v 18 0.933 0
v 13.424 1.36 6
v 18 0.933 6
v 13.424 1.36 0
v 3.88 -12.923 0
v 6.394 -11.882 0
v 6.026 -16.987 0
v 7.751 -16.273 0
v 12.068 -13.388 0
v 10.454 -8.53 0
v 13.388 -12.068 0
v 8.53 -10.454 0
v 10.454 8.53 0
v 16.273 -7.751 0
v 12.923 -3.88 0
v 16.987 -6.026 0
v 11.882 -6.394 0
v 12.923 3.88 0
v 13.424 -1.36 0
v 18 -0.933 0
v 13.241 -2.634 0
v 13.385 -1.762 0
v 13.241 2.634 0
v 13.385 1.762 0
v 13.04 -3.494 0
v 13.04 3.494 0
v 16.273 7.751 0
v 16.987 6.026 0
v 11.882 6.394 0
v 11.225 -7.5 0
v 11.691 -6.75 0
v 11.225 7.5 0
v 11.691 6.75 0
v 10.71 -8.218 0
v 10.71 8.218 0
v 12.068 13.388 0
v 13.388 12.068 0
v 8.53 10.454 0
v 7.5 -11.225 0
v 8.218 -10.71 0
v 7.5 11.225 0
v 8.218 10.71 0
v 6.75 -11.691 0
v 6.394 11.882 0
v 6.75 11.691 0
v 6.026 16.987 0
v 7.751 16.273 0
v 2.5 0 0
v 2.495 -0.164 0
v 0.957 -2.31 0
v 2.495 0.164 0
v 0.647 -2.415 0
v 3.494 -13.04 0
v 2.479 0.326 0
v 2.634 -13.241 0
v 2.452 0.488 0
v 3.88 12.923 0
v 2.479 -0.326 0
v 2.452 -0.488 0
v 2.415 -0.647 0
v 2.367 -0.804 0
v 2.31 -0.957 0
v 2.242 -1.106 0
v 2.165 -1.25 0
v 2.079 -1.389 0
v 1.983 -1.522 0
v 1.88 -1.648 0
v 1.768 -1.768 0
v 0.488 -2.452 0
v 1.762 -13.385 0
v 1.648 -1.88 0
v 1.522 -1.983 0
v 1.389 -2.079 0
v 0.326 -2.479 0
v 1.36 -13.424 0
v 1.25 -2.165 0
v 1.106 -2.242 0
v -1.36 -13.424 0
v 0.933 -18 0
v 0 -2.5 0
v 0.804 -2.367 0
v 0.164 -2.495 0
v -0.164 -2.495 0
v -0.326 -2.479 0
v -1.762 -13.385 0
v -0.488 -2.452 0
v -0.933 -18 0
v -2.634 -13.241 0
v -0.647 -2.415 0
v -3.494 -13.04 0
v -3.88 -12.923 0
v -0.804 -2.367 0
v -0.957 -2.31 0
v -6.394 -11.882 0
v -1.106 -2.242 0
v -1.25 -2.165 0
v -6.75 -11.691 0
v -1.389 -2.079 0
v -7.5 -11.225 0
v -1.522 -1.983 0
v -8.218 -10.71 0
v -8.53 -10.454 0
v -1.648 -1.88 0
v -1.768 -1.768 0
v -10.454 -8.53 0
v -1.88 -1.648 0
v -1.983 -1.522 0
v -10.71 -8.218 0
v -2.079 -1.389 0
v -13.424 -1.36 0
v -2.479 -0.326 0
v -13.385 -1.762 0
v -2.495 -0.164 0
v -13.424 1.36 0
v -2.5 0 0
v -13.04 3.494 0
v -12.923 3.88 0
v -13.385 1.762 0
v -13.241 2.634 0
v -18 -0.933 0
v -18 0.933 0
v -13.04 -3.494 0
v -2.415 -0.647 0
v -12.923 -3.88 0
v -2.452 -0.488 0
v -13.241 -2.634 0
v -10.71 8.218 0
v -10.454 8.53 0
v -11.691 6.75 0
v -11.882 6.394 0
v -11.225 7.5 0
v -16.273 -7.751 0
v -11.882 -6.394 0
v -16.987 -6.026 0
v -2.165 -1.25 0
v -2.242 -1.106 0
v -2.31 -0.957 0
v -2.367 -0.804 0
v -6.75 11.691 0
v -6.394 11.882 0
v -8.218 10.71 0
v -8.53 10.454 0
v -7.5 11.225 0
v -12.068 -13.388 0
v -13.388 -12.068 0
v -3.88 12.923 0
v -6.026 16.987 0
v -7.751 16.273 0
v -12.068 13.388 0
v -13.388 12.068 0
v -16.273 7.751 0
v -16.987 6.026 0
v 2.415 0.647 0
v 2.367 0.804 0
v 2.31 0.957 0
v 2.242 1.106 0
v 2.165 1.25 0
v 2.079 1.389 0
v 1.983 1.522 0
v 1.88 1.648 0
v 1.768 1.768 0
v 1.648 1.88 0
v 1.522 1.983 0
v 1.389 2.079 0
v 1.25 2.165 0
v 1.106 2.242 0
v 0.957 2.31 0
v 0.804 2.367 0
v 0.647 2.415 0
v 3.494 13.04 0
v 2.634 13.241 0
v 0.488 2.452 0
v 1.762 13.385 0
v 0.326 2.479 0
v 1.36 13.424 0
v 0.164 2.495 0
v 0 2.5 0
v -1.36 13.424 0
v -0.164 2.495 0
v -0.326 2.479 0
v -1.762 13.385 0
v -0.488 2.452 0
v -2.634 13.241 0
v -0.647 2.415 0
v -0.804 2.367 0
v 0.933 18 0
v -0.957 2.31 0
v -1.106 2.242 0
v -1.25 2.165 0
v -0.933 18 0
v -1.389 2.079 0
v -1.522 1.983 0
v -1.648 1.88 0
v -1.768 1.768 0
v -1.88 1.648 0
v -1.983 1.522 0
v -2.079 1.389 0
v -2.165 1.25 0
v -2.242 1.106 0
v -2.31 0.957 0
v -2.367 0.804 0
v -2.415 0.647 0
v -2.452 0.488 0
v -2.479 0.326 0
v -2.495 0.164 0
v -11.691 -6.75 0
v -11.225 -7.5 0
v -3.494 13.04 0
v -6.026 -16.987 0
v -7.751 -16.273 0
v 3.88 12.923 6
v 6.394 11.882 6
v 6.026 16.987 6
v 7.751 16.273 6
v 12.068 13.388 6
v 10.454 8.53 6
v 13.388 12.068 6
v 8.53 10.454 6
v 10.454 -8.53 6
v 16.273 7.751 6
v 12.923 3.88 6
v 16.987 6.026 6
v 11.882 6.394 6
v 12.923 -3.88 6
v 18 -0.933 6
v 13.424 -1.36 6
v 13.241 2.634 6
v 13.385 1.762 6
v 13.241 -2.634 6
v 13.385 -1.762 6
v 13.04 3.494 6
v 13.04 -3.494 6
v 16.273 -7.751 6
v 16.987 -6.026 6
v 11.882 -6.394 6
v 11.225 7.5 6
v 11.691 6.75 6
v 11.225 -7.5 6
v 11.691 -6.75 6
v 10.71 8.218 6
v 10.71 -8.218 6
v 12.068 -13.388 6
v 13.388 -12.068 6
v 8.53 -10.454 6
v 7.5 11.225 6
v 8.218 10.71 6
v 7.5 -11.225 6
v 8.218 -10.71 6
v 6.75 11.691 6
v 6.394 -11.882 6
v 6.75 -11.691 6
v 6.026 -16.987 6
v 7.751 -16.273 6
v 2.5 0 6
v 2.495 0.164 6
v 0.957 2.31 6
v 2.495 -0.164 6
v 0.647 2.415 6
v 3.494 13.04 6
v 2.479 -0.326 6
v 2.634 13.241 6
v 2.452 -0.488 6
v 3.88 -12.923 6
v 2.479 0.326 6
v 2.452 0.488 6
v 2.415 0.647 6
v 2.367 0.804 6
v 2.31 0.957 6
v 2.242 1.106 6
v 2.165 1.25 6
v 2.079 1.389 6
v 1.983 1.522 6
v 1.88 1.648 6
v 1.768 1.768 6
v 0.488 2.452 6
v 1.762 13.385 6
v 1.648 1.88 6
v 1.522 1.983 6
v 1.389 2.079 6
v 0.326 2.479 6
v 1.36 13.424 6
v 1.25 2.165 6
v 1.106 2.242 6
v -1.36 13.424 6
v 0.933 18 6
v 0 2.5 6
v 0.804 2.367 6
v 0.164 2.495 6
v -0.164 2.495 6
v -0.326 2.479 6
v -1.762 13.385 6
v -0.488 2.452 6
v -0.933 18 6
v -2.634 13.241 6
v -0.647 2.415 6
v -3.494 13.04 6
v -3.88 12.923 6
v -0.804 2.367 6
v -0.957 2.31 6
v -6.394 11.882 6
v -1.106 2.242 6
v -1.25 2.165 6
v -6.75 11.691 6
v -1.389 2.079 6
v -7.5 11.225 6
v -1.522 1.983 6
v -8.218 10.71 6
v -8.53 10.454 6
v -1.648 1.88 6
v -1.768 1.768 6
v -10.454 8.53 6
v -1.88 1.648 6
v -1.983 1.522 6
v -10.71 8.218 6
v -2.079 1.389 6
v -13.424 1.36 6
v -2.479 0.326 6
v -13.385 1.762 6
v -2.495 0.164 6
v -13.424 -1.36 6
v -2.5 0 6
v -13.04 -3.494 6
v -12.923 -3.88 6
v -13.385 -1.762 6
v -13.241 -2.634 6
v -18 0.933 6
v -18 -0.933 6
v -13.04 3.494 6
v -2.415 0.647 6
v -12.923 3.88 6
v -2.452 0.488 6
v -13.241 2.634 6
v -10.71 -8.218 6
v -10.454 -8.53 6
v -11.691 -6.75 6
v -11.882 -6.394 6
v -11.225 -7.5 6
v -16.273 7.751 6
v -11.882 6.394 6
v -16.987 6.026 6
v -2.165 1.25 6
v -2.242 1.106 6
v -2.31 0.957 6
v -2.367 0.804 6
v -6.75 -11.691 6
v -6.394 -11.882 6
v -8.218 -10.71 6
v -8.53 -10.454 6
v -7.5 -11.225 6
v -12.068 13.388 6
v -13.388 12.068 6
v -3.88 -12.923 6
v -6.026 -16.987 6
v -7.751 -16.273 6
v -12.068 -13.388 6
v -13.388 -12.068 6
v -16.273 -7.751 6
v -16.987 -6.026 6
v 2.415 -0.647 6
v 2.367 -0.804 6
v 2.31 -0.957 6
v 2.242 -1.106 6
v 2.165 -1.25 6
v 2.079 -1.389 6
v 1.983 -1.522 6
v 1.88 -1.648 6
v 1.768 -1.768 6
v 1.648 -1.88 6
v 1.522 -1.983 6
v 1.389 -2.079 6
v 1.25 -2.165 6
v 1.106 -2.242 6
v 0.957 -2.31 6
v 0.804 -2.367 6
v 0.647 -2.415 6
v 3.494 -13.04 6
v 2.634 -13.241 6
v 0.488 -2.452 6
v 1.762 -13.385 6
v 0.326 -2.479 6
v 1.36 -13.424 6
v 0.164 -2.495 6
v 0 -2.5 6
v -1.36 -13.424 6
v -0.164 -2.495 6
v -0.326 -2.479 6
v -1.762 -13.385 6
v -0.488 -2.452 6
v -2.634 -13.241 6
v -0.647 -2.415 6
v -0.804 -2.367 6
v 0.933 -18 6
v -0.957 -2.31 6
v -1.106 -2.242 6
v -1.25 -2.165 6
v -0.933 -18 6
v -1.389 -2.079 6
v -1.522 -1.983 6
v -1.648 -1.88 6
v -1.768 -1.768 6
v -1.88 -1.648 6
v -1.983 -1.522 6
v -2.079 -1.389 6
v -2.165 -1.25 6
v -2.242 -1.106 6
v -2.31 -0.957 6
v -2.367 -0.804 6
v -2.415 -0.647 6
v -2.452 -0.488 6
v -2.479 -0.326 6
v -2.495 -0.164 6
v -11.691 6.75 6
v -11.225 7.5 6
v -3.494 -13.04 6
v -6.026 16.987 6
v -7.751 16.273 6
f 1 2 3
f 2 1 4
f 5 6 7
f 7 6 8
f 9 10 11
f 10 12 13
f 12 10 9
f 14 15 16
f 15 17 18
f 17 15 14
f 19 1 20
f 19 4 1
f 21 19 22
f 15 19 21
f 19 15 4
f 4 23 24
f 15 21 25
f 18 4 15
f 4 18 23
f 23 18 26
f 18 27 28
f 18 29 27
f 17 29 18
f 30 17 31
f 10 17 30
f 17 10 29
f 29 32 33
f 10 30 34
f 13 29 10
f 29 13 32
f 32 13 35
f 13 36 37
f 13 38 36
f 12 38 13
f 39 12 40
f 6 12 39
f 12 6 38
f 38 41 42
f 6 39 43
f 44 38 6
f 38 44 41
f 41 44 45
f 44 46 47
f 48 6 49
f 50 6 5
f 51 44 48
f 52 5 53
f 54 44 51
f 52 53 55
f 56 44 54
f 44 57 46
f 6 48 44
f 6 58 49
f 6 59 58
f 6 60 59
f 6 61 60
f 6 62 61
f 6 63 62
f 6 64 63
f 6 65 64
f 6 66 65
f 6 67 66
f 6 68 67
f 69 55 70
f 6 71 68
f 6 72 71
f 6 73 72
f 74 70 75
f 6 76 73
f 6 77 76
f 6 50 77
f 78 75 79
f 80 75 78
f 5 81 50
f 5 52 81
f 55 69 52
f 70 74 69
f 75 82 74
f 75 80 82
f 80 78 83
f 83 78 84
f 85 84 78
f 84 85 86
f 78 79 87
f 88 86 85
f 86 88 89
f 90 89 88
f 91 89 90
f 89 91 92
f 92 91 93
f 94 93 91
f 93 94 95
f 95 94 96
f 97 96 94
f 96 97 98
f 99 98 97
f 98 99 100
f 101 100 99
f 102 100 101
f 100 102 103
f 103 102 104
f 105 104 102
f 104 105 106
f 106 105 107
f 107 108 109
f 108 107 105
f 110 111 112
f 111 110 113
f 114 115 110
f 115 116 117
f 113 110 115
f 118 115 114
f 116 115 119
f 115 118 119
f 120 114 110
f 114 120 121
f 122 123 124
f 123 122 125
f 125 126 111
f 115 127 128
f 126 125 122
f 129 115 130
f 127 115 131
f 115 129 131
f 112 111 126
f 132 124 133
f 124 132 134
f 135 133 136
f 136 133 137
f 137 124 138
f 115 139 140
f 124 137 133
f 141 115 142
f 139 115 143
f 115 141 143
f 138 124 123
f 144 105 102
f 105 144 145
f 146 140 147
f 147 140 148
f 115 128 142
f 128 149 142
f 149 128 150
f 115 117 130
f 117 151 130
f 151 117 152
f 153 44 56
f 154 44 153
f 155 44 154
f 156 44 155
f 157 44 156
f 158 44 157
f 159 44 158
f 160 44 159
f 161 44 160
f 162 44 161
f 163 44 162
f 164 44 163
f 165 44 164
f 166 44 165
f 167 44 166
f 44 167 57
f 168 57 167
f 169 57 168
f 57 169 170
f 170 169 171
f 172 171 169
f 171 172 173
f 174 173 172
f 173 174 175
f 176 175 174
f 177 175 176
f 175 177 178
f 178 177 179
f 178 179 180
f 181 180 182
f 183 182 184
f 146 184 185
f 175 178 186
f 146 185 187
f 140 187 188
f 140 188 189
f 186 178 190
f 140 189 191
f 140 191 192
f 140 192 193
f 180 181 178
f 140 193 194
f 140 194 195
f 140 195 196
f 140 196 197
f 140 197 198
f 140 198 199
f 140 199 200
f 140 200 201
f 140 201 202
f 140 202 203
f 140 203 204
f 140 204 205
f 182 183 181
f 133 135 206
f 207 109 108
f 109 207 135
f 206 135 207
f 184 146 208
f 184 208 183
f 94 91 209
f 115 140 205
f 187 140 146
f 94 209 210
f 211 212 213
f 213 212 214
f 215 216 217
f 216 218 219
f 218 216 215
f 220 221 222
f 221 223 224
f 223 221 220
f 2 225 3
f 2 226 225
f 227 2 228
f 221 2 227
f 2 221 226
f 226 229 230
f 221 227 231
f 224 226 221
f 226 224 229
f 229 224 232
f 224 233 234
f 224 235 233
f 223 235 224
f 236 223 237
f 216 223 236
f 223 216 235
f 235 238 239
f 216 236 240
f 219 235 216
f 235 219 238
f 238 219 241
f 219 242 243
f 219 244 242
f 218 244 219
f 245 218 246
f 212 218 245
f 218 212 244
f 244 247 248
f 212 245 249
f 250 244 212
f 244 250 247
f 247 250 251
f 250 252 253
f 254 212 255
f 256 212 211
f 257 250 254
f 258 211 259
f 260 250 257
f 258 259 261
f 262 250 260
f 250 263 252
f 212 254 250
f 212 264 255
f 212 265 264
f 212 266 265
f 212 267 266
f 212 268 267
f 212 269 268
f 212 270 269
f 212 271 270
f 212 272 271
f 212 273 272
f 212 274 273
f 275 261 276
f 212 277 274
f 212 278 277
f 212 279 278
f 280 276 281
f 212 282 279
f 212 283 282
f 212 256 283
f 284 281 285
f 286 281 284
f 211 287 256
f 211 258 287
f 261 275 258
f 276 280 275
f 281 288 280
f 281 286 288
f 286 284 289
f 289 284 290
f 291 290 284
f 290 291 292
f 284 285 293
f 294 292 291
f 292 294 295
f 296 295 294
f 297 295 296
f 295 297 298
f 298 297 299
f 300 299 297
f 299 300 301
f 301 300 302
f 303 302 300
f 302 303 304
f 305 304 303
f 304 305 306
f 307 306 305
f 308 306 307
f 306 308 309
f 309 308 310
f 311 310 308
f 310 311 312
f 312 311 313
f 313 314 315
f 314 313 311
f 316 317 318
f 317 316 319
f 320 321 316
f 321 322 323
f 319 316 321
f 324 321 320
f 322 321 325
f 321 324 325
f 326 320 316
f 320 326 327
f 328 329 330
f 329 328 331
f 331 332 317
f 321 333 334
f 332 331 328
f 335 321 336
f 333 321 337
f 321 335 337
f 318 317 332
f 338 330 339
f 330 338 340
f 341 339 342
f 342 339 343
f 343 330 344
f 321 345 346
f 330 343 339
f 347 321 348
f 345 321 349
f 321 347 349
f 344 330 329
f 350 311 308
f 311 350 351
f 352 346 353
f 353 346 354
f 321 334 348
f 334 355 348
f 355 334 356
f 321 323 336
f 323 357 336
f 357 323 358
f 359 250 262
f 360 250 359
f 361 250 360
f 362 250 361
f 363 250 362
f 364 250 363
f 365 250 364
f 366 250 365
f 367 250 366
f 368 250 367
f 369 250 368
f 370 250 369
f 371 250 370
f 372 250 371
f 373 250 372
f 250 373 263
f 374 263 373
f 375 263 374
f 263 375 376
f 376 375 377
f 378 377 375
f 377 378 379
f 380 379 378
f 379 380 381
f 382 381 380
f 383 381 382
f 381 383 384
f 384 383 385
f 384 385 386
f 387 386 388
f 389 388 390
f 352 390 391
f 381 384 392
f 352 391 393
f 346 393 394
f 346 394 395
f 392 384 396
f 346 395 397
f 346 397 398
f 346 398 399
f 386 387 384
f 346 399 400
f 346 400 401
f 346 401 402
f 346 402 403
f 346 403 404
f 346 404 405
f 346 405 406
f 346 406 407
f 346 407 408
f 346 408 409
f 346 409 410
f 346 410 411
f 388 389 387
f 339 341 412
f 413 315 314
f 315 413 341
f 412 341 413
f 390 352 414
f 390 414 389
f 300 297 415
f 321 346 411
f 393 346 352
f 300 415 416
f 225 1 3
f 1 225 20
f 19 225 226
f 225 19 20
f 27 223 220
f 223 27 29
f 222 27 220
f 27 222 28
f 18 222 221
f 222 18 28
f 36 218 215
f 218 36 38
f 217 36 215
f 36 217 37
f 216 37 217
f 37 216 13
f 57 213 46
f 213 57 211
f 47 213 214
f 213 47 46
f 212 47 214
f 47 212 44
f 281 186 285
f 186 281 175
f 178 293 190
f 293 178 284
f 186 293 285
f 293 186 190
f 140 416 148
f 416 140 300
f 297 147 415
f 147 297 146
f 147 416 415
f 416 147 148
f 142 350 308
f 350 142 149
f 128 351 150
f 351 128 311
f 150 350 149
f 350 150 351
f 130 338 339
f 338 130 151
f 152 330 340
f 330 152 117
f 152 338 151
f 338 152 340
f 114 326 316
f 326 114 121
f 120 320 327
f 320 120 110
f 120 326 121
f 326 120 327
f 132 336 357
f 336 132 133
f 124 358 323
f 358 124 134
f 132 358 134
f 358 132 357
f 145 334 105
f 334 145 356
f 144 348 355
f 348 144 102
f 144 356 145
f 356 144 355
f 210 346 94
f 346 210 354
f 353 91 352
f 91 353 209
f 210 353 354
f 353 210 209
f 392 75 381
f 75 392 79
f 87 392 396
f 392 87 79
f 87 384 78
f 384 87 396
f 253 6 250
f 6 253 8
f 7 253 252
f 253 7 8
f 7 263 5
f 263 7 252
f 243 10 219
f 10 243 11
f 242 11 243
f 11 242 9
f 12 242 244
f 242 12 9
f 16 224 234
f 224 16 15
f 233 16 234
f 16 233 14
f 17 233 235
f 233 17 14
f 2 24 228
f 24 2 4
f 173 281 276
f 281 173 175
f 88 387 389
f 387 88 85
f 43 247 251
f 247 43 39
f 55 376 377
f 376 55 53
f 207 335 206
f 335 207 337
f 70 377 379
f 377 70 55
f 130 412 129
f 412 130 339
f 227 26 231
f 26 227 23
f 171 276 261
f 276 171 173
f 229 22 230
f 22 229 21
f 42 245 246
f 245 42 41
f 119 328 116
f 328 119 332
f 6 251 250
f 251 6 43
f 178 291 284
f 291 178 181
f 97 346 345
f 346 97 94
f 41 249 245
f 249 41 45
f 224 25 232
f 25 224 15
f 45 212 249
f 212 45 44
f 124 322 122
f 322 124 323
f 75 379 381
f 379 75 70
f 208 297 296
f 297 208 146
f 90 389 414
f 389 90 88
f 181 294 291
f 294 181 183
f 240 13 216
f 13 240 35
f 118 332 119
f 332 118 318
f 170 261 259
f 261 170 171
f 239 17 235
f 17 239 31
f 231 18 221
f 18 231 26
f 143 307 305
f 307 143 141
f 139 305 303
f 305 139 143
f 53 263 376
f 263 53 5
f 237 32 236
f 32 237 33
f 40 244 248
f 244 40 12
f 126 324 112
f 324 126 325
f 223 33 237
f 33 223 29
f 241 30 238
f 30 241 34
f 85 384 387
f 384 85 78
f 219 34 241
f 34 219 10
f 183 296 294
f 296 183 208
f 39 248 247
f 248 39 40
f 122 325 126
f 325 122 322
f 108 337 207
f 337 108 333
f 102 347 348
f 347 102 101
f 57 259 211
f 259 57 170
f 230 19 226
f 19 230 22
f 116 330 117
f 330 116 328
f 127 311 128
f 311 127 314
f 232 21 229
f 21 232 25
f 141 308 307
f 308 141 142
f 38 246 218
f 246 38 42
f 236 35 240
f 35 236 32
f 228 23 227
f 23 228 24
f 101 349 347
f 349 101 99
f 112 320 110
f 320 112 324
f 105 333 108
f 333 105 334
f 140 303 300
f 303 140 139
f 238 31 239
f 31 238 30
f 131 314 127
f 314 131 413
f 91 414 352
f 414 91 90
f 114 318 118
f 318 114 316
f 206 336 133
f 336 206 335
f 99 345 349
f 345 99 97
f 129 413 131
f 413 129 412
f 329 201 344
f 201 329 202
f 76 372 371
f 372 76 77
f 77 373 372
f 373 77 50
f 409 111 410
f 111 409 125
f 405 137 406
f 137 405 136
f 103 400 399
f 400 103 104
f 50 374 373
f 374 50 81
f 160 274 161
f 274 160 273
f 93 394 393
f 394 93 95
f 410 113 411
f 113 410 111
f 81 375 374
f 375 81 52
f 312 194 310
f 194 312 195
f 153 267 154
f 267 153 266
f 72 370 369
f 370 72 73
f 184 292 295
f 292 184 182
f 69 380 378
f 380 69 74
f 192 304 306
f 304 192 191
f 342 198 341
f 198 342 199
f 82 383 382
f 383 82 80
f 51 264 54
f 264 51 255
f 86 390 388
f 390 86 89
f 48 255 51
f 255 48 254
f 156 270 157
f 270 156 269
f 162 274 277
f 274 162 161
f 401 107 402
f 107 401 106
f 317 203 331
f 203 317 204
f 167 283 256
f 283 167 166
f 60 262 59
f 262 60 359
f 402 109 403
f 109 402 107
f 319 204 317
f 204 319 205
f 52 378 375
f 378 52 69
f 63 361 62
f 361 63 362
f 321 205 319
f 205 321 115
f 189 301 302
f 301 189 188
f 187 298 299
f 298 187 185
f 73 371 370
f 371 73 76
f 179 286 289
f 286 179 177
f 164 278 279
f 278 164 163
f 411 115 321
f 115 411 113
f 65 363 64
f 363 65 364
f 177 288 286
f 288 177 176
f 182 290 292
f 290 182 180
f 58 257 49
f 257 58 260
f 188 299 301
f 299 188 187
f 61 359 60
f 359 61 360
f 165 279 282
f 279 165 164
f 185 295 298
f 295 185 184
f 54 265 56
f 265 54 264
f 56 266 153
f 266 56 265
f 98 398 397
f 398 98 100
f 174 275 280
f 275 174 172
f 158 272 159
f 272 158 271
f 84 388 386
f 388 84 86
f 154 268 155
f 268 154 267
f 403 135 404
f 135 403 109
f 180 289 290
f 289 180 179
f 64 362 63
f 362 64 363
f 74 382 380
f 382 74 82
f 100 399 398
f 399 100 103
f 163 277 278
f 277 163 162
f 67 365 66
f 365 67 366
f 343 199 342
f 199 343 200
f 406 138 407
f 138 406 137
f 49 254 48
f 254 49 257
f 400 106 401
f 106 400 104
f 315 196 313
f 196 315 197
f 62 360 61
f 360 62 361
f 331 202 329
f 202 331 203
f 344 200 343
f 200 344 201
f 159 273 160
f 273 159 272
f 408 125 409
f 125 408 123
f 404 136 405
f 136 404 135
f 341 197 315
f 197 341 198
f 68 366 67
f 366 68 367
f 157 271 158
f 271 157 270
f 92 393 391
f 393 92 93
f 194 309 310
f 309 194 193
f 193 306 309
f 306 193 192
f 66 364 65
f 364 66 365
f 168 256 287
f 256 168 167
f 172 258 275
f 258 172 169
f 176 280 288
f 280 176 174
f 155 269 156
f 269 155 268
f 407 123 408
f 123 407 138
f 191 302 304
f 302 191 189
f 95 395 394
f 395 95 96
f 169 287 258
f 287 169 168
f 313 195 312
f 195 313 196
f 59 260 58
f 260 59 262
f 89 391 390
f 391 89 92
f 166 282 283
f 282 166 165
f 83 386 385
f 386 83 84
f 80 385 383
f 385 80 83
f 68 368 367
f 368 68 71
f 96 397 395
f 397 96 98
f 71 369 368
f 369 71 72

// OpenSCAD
// Spur gear (simplified teeth) - a flat gear with a hub and a central bore. The teeth are a
// trapezoidal approximation (not a true involute) but they print and mesh for light use.
// NOVEL general mechanical part.
//
// @desc spur gear with a central bore (simplified trapezoidal teeth)
// @prompt Design a spur gear in OpenSCAD with {teeth} teeth, a module of {mod} mm, {thick} mm thick, and a {bore} mm central bore. Reply with a single complete OpenSCAD file.
// @param teeth number of teeth     [8:40:1]
// @param mod   gear module, mm     [1:4:0.5]
// @param thick thickness, mm       [3:12]
// @param bore  central bore, mm    [2:12]

teeth = 16;
mod   = 2;
thick = 6;
bore  = 5;

$fn = 96;

pitch_r = mod * teeth / 2;
root_r  = pitch_r - 1.25 * mod;
tw      = mod * 1.4;                 // tooth width near the pitch line

difference() {
    union() {
        cylinder(h = thick, r = root_r);
        for (i = [0 : teeth - 1])
            rotate([0, 0, i * 360 / teeth])
                translate([pitch_r, 0, 0])
                    linear_extrude(thick)
                        polygon([[-1.5 * mod, -tw / 2], [-1.5 * mod, tw / 2],
                                 [mod, tw / 3],          [mod, -tw / 3]]);
    }
    translate([0, 0, -1]) cylinder(h = thick + 2, d = bore);
}
